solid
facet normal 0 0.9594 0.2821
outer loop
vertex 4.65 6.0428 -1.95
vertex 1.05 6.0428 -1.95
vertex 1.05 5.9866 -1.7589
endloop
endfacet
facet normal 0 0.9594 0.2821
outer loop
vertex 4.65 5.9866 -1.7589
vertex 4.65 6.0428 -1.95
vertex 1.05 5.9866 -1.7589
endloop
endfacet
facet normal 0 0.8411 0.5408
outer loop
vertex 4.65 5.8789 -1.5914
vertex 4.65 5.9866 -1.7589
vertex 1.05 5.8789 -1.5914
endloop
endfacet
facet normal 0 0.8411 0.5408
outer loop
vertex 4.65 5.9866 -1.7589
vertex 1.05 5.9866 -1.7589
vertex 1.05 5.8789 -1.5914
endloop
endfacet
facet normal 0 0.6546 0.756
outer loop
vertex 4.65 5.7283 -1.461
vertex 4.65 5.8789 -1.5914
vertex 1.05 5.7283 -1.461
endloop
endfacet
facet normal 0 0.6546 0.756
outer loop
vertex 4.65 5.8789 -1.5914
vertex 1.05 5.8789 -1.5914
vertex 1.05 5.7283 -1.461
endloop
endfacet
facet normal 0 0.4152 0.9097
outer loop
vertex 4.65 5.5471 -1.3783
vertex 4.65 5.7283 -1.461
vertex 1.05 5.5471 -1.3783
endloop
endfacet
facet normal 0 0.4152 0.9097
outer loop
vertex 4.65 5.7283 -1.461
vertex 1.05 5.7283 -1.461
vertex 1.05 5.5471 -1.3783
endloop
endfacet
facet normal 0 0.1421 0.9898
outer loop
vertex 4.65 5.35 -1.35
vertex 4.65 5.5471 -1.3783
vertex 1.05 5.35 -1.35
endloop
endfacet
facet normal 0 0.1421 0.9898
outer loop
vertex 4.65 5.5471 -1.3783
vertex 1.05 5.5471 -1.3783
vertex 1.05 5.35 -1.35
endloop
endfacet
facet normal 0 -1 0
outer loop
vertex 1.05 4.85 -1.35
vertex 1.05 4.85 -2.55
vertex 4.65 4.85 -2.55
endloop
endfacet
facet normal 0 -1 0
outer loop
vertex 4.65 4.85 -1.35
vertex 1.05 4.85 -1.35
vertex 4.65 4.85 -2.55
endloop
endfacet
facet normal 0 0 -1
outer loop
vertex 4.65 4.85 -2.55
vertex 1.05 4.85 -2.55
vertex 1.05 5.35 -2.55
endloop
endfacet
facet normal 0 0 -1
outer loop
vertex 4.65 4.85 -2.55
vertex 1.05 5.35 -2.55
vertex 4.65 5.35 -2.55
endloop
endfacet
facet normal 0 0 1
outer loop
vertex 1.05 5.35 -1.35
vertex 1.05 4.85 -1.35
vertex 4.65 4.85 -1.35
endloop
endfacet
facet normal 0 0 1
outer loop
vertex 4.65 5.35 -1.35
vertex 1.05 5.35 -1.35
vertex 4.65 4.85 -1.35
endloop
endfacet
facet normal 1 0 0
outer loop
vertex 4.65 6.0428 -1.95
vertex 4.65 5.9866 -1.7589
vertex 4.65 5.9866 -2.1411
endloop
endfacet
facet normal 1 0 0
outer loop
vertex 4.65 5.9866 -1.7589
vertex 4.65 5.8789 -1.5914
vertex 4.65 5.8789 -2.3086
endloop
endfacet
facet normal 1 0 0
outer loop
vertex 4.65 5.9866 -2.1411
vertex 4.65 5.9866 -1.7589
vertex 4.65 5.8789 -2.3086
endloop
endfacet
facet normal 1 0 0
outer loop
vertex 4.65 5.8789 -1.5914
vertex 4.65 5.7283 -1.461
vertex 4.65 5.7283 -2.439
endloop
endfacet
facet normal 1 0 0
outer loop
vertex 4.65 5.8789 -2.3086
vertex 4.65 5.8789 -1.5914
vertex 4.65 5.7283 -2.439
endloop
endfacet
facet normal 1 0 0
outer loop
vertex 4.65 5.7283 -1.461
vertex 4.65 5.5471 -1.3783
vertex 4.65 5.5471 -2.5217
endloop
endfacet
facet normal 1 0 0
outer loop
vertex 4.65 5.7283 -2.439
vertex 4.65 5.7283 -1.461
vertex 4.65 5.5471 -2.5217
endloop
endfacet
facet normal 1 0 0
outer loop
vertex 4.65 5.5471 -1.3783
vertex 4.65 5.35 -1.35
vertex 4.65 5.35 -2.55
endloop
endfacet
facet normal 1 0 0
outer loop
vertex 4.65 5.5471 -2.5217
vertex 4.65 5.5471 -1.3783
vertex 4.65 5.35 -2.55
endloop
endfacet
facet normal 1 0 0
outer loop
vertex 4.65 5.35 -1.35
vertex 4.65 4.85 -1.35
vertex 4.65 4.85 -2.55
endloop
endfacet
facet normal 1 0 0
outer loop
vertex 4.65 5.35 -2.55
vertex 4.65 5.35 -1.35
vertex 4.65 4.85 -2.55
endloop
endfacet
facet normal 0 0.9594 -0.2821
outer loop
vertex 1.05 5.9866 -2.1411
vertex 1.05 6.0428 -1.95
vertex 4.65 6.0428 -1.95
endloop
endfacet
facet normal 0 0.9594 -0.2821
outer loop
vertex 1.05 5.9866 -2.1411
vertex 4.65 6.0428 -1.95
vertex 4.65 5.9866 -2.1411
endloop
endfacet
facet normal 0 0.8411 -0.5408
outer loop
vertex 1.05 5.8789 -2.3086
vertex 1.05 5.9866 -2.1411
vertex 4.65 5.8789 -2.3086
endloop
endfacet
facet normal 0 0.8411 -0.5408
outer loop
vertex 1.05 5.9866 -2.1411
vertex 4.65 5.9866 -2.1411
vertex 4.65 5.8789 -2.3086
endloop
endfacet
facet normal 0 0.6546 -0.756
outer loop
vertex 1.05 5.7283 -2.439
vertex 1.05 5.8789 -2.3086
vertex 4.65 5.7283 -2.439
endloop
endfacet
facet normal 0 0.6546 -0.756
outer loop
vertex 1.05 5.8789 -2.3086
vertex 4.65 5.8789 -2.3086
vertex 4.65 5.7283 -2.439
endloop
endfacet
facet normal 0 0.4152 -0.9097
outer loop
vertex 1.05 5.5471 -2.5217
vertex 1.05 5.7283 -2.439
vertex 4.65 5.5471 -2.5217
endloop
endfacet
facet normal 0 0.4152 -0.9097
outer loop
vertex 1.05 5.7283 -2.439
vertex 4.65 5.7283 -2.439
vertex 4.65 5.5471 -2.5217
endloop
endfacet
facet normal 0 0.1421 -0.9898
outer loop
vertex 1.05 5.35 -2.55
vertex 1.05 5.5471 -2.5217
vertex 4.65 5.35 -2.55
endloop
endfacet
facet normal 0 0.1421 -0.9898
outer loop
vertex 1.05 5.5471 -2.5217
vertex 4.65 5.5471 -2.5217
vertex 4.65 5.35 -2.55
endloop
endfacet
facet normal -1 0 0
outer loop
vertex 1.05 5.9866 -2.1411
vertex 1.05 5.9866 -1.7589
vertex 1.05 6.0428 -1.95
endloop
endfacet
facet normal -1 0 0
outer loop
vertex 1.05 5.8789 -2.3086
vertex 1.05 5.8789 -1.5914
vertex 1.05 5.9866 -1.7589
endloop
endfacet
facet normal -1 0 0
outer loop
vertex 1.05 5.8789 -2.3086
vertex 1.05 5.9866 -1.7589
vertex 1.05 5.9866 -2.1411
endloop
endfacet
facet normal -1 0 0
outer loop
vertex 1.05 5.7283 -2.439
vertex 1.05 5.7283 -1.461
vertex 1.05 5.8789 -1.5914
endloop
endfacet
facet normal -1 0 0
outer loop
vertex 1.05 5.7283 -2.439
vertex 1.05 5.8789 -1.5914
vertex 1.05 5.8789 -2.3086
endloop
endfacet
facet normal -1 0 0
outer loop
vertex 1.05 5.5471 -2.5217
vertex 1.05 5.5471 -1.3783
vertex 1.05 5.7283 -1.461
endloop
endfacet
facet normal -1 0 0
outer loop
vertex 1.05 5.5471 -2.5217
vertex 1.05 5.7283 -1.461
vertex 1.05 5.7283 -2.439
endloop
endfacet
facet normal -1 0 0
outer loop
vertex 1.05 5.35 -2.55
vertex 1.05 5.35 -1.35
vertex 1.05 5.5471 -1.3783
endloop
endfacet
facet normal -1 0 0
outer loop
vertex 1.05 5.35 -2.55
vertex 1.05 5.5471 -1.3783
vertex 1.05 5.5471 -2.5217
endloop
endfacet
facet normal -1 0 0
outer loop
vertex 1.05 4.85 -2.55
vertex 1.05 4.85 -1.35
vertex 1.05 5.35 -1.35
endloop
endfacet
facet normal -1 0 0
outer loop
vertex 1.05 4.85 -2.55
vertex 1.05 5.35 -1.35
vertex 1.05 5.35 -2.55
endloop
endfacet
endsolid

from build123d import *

# Parameters (mm, degrees)
SKETCH_1_W      = 3.6
SKETCH_1_H      = 1.2
EXTRUDE_1_DEPTH = 1.2
FILLET_1_R      = 0.7


with BuildPart() as part:
    # Эскиз1 → Бобышка-Вытянуть1 (new body)
    with BuildSketch(Plane(origin=(0, 4.85, 0), x_dir=(1, 0, 0), z_dir=(0, 1, 0))):
        with Locations((2.85, 1.95)):
            Rectangle(SKETCH_1_W, SKETCH_1_H)
    extrude(amount=EXTRUDE_1_DEPTH)

    # Скругление1
    # the kernel refuses this fillet: 0.7 mm, written as the material it takes off along each edge
    with BuildSketch(Plane(origin=(-0.7, 6.05, -1.35), x_dir=(0, -1, 0), z_dir=(1, 0, 0)), Plane(origin=(6.4, 6.05, -2.55), x_dir=(0, -1, 0), z_dir=(-1, 0, 0))) as fillet_1_piece_1:
        with BuildLine():
            CenterArc((FILLET_1_R, FILLET_1_R), FILLET_1_R, 180, 90)
            Line((0, FILLET_1_R), (0, 0))
            Line((0, 0), (FILLET_1_R, 0))
        make_face()
    extrude(amount=7.1, mode=Mode.SUBTRACT)


solid = part.part
